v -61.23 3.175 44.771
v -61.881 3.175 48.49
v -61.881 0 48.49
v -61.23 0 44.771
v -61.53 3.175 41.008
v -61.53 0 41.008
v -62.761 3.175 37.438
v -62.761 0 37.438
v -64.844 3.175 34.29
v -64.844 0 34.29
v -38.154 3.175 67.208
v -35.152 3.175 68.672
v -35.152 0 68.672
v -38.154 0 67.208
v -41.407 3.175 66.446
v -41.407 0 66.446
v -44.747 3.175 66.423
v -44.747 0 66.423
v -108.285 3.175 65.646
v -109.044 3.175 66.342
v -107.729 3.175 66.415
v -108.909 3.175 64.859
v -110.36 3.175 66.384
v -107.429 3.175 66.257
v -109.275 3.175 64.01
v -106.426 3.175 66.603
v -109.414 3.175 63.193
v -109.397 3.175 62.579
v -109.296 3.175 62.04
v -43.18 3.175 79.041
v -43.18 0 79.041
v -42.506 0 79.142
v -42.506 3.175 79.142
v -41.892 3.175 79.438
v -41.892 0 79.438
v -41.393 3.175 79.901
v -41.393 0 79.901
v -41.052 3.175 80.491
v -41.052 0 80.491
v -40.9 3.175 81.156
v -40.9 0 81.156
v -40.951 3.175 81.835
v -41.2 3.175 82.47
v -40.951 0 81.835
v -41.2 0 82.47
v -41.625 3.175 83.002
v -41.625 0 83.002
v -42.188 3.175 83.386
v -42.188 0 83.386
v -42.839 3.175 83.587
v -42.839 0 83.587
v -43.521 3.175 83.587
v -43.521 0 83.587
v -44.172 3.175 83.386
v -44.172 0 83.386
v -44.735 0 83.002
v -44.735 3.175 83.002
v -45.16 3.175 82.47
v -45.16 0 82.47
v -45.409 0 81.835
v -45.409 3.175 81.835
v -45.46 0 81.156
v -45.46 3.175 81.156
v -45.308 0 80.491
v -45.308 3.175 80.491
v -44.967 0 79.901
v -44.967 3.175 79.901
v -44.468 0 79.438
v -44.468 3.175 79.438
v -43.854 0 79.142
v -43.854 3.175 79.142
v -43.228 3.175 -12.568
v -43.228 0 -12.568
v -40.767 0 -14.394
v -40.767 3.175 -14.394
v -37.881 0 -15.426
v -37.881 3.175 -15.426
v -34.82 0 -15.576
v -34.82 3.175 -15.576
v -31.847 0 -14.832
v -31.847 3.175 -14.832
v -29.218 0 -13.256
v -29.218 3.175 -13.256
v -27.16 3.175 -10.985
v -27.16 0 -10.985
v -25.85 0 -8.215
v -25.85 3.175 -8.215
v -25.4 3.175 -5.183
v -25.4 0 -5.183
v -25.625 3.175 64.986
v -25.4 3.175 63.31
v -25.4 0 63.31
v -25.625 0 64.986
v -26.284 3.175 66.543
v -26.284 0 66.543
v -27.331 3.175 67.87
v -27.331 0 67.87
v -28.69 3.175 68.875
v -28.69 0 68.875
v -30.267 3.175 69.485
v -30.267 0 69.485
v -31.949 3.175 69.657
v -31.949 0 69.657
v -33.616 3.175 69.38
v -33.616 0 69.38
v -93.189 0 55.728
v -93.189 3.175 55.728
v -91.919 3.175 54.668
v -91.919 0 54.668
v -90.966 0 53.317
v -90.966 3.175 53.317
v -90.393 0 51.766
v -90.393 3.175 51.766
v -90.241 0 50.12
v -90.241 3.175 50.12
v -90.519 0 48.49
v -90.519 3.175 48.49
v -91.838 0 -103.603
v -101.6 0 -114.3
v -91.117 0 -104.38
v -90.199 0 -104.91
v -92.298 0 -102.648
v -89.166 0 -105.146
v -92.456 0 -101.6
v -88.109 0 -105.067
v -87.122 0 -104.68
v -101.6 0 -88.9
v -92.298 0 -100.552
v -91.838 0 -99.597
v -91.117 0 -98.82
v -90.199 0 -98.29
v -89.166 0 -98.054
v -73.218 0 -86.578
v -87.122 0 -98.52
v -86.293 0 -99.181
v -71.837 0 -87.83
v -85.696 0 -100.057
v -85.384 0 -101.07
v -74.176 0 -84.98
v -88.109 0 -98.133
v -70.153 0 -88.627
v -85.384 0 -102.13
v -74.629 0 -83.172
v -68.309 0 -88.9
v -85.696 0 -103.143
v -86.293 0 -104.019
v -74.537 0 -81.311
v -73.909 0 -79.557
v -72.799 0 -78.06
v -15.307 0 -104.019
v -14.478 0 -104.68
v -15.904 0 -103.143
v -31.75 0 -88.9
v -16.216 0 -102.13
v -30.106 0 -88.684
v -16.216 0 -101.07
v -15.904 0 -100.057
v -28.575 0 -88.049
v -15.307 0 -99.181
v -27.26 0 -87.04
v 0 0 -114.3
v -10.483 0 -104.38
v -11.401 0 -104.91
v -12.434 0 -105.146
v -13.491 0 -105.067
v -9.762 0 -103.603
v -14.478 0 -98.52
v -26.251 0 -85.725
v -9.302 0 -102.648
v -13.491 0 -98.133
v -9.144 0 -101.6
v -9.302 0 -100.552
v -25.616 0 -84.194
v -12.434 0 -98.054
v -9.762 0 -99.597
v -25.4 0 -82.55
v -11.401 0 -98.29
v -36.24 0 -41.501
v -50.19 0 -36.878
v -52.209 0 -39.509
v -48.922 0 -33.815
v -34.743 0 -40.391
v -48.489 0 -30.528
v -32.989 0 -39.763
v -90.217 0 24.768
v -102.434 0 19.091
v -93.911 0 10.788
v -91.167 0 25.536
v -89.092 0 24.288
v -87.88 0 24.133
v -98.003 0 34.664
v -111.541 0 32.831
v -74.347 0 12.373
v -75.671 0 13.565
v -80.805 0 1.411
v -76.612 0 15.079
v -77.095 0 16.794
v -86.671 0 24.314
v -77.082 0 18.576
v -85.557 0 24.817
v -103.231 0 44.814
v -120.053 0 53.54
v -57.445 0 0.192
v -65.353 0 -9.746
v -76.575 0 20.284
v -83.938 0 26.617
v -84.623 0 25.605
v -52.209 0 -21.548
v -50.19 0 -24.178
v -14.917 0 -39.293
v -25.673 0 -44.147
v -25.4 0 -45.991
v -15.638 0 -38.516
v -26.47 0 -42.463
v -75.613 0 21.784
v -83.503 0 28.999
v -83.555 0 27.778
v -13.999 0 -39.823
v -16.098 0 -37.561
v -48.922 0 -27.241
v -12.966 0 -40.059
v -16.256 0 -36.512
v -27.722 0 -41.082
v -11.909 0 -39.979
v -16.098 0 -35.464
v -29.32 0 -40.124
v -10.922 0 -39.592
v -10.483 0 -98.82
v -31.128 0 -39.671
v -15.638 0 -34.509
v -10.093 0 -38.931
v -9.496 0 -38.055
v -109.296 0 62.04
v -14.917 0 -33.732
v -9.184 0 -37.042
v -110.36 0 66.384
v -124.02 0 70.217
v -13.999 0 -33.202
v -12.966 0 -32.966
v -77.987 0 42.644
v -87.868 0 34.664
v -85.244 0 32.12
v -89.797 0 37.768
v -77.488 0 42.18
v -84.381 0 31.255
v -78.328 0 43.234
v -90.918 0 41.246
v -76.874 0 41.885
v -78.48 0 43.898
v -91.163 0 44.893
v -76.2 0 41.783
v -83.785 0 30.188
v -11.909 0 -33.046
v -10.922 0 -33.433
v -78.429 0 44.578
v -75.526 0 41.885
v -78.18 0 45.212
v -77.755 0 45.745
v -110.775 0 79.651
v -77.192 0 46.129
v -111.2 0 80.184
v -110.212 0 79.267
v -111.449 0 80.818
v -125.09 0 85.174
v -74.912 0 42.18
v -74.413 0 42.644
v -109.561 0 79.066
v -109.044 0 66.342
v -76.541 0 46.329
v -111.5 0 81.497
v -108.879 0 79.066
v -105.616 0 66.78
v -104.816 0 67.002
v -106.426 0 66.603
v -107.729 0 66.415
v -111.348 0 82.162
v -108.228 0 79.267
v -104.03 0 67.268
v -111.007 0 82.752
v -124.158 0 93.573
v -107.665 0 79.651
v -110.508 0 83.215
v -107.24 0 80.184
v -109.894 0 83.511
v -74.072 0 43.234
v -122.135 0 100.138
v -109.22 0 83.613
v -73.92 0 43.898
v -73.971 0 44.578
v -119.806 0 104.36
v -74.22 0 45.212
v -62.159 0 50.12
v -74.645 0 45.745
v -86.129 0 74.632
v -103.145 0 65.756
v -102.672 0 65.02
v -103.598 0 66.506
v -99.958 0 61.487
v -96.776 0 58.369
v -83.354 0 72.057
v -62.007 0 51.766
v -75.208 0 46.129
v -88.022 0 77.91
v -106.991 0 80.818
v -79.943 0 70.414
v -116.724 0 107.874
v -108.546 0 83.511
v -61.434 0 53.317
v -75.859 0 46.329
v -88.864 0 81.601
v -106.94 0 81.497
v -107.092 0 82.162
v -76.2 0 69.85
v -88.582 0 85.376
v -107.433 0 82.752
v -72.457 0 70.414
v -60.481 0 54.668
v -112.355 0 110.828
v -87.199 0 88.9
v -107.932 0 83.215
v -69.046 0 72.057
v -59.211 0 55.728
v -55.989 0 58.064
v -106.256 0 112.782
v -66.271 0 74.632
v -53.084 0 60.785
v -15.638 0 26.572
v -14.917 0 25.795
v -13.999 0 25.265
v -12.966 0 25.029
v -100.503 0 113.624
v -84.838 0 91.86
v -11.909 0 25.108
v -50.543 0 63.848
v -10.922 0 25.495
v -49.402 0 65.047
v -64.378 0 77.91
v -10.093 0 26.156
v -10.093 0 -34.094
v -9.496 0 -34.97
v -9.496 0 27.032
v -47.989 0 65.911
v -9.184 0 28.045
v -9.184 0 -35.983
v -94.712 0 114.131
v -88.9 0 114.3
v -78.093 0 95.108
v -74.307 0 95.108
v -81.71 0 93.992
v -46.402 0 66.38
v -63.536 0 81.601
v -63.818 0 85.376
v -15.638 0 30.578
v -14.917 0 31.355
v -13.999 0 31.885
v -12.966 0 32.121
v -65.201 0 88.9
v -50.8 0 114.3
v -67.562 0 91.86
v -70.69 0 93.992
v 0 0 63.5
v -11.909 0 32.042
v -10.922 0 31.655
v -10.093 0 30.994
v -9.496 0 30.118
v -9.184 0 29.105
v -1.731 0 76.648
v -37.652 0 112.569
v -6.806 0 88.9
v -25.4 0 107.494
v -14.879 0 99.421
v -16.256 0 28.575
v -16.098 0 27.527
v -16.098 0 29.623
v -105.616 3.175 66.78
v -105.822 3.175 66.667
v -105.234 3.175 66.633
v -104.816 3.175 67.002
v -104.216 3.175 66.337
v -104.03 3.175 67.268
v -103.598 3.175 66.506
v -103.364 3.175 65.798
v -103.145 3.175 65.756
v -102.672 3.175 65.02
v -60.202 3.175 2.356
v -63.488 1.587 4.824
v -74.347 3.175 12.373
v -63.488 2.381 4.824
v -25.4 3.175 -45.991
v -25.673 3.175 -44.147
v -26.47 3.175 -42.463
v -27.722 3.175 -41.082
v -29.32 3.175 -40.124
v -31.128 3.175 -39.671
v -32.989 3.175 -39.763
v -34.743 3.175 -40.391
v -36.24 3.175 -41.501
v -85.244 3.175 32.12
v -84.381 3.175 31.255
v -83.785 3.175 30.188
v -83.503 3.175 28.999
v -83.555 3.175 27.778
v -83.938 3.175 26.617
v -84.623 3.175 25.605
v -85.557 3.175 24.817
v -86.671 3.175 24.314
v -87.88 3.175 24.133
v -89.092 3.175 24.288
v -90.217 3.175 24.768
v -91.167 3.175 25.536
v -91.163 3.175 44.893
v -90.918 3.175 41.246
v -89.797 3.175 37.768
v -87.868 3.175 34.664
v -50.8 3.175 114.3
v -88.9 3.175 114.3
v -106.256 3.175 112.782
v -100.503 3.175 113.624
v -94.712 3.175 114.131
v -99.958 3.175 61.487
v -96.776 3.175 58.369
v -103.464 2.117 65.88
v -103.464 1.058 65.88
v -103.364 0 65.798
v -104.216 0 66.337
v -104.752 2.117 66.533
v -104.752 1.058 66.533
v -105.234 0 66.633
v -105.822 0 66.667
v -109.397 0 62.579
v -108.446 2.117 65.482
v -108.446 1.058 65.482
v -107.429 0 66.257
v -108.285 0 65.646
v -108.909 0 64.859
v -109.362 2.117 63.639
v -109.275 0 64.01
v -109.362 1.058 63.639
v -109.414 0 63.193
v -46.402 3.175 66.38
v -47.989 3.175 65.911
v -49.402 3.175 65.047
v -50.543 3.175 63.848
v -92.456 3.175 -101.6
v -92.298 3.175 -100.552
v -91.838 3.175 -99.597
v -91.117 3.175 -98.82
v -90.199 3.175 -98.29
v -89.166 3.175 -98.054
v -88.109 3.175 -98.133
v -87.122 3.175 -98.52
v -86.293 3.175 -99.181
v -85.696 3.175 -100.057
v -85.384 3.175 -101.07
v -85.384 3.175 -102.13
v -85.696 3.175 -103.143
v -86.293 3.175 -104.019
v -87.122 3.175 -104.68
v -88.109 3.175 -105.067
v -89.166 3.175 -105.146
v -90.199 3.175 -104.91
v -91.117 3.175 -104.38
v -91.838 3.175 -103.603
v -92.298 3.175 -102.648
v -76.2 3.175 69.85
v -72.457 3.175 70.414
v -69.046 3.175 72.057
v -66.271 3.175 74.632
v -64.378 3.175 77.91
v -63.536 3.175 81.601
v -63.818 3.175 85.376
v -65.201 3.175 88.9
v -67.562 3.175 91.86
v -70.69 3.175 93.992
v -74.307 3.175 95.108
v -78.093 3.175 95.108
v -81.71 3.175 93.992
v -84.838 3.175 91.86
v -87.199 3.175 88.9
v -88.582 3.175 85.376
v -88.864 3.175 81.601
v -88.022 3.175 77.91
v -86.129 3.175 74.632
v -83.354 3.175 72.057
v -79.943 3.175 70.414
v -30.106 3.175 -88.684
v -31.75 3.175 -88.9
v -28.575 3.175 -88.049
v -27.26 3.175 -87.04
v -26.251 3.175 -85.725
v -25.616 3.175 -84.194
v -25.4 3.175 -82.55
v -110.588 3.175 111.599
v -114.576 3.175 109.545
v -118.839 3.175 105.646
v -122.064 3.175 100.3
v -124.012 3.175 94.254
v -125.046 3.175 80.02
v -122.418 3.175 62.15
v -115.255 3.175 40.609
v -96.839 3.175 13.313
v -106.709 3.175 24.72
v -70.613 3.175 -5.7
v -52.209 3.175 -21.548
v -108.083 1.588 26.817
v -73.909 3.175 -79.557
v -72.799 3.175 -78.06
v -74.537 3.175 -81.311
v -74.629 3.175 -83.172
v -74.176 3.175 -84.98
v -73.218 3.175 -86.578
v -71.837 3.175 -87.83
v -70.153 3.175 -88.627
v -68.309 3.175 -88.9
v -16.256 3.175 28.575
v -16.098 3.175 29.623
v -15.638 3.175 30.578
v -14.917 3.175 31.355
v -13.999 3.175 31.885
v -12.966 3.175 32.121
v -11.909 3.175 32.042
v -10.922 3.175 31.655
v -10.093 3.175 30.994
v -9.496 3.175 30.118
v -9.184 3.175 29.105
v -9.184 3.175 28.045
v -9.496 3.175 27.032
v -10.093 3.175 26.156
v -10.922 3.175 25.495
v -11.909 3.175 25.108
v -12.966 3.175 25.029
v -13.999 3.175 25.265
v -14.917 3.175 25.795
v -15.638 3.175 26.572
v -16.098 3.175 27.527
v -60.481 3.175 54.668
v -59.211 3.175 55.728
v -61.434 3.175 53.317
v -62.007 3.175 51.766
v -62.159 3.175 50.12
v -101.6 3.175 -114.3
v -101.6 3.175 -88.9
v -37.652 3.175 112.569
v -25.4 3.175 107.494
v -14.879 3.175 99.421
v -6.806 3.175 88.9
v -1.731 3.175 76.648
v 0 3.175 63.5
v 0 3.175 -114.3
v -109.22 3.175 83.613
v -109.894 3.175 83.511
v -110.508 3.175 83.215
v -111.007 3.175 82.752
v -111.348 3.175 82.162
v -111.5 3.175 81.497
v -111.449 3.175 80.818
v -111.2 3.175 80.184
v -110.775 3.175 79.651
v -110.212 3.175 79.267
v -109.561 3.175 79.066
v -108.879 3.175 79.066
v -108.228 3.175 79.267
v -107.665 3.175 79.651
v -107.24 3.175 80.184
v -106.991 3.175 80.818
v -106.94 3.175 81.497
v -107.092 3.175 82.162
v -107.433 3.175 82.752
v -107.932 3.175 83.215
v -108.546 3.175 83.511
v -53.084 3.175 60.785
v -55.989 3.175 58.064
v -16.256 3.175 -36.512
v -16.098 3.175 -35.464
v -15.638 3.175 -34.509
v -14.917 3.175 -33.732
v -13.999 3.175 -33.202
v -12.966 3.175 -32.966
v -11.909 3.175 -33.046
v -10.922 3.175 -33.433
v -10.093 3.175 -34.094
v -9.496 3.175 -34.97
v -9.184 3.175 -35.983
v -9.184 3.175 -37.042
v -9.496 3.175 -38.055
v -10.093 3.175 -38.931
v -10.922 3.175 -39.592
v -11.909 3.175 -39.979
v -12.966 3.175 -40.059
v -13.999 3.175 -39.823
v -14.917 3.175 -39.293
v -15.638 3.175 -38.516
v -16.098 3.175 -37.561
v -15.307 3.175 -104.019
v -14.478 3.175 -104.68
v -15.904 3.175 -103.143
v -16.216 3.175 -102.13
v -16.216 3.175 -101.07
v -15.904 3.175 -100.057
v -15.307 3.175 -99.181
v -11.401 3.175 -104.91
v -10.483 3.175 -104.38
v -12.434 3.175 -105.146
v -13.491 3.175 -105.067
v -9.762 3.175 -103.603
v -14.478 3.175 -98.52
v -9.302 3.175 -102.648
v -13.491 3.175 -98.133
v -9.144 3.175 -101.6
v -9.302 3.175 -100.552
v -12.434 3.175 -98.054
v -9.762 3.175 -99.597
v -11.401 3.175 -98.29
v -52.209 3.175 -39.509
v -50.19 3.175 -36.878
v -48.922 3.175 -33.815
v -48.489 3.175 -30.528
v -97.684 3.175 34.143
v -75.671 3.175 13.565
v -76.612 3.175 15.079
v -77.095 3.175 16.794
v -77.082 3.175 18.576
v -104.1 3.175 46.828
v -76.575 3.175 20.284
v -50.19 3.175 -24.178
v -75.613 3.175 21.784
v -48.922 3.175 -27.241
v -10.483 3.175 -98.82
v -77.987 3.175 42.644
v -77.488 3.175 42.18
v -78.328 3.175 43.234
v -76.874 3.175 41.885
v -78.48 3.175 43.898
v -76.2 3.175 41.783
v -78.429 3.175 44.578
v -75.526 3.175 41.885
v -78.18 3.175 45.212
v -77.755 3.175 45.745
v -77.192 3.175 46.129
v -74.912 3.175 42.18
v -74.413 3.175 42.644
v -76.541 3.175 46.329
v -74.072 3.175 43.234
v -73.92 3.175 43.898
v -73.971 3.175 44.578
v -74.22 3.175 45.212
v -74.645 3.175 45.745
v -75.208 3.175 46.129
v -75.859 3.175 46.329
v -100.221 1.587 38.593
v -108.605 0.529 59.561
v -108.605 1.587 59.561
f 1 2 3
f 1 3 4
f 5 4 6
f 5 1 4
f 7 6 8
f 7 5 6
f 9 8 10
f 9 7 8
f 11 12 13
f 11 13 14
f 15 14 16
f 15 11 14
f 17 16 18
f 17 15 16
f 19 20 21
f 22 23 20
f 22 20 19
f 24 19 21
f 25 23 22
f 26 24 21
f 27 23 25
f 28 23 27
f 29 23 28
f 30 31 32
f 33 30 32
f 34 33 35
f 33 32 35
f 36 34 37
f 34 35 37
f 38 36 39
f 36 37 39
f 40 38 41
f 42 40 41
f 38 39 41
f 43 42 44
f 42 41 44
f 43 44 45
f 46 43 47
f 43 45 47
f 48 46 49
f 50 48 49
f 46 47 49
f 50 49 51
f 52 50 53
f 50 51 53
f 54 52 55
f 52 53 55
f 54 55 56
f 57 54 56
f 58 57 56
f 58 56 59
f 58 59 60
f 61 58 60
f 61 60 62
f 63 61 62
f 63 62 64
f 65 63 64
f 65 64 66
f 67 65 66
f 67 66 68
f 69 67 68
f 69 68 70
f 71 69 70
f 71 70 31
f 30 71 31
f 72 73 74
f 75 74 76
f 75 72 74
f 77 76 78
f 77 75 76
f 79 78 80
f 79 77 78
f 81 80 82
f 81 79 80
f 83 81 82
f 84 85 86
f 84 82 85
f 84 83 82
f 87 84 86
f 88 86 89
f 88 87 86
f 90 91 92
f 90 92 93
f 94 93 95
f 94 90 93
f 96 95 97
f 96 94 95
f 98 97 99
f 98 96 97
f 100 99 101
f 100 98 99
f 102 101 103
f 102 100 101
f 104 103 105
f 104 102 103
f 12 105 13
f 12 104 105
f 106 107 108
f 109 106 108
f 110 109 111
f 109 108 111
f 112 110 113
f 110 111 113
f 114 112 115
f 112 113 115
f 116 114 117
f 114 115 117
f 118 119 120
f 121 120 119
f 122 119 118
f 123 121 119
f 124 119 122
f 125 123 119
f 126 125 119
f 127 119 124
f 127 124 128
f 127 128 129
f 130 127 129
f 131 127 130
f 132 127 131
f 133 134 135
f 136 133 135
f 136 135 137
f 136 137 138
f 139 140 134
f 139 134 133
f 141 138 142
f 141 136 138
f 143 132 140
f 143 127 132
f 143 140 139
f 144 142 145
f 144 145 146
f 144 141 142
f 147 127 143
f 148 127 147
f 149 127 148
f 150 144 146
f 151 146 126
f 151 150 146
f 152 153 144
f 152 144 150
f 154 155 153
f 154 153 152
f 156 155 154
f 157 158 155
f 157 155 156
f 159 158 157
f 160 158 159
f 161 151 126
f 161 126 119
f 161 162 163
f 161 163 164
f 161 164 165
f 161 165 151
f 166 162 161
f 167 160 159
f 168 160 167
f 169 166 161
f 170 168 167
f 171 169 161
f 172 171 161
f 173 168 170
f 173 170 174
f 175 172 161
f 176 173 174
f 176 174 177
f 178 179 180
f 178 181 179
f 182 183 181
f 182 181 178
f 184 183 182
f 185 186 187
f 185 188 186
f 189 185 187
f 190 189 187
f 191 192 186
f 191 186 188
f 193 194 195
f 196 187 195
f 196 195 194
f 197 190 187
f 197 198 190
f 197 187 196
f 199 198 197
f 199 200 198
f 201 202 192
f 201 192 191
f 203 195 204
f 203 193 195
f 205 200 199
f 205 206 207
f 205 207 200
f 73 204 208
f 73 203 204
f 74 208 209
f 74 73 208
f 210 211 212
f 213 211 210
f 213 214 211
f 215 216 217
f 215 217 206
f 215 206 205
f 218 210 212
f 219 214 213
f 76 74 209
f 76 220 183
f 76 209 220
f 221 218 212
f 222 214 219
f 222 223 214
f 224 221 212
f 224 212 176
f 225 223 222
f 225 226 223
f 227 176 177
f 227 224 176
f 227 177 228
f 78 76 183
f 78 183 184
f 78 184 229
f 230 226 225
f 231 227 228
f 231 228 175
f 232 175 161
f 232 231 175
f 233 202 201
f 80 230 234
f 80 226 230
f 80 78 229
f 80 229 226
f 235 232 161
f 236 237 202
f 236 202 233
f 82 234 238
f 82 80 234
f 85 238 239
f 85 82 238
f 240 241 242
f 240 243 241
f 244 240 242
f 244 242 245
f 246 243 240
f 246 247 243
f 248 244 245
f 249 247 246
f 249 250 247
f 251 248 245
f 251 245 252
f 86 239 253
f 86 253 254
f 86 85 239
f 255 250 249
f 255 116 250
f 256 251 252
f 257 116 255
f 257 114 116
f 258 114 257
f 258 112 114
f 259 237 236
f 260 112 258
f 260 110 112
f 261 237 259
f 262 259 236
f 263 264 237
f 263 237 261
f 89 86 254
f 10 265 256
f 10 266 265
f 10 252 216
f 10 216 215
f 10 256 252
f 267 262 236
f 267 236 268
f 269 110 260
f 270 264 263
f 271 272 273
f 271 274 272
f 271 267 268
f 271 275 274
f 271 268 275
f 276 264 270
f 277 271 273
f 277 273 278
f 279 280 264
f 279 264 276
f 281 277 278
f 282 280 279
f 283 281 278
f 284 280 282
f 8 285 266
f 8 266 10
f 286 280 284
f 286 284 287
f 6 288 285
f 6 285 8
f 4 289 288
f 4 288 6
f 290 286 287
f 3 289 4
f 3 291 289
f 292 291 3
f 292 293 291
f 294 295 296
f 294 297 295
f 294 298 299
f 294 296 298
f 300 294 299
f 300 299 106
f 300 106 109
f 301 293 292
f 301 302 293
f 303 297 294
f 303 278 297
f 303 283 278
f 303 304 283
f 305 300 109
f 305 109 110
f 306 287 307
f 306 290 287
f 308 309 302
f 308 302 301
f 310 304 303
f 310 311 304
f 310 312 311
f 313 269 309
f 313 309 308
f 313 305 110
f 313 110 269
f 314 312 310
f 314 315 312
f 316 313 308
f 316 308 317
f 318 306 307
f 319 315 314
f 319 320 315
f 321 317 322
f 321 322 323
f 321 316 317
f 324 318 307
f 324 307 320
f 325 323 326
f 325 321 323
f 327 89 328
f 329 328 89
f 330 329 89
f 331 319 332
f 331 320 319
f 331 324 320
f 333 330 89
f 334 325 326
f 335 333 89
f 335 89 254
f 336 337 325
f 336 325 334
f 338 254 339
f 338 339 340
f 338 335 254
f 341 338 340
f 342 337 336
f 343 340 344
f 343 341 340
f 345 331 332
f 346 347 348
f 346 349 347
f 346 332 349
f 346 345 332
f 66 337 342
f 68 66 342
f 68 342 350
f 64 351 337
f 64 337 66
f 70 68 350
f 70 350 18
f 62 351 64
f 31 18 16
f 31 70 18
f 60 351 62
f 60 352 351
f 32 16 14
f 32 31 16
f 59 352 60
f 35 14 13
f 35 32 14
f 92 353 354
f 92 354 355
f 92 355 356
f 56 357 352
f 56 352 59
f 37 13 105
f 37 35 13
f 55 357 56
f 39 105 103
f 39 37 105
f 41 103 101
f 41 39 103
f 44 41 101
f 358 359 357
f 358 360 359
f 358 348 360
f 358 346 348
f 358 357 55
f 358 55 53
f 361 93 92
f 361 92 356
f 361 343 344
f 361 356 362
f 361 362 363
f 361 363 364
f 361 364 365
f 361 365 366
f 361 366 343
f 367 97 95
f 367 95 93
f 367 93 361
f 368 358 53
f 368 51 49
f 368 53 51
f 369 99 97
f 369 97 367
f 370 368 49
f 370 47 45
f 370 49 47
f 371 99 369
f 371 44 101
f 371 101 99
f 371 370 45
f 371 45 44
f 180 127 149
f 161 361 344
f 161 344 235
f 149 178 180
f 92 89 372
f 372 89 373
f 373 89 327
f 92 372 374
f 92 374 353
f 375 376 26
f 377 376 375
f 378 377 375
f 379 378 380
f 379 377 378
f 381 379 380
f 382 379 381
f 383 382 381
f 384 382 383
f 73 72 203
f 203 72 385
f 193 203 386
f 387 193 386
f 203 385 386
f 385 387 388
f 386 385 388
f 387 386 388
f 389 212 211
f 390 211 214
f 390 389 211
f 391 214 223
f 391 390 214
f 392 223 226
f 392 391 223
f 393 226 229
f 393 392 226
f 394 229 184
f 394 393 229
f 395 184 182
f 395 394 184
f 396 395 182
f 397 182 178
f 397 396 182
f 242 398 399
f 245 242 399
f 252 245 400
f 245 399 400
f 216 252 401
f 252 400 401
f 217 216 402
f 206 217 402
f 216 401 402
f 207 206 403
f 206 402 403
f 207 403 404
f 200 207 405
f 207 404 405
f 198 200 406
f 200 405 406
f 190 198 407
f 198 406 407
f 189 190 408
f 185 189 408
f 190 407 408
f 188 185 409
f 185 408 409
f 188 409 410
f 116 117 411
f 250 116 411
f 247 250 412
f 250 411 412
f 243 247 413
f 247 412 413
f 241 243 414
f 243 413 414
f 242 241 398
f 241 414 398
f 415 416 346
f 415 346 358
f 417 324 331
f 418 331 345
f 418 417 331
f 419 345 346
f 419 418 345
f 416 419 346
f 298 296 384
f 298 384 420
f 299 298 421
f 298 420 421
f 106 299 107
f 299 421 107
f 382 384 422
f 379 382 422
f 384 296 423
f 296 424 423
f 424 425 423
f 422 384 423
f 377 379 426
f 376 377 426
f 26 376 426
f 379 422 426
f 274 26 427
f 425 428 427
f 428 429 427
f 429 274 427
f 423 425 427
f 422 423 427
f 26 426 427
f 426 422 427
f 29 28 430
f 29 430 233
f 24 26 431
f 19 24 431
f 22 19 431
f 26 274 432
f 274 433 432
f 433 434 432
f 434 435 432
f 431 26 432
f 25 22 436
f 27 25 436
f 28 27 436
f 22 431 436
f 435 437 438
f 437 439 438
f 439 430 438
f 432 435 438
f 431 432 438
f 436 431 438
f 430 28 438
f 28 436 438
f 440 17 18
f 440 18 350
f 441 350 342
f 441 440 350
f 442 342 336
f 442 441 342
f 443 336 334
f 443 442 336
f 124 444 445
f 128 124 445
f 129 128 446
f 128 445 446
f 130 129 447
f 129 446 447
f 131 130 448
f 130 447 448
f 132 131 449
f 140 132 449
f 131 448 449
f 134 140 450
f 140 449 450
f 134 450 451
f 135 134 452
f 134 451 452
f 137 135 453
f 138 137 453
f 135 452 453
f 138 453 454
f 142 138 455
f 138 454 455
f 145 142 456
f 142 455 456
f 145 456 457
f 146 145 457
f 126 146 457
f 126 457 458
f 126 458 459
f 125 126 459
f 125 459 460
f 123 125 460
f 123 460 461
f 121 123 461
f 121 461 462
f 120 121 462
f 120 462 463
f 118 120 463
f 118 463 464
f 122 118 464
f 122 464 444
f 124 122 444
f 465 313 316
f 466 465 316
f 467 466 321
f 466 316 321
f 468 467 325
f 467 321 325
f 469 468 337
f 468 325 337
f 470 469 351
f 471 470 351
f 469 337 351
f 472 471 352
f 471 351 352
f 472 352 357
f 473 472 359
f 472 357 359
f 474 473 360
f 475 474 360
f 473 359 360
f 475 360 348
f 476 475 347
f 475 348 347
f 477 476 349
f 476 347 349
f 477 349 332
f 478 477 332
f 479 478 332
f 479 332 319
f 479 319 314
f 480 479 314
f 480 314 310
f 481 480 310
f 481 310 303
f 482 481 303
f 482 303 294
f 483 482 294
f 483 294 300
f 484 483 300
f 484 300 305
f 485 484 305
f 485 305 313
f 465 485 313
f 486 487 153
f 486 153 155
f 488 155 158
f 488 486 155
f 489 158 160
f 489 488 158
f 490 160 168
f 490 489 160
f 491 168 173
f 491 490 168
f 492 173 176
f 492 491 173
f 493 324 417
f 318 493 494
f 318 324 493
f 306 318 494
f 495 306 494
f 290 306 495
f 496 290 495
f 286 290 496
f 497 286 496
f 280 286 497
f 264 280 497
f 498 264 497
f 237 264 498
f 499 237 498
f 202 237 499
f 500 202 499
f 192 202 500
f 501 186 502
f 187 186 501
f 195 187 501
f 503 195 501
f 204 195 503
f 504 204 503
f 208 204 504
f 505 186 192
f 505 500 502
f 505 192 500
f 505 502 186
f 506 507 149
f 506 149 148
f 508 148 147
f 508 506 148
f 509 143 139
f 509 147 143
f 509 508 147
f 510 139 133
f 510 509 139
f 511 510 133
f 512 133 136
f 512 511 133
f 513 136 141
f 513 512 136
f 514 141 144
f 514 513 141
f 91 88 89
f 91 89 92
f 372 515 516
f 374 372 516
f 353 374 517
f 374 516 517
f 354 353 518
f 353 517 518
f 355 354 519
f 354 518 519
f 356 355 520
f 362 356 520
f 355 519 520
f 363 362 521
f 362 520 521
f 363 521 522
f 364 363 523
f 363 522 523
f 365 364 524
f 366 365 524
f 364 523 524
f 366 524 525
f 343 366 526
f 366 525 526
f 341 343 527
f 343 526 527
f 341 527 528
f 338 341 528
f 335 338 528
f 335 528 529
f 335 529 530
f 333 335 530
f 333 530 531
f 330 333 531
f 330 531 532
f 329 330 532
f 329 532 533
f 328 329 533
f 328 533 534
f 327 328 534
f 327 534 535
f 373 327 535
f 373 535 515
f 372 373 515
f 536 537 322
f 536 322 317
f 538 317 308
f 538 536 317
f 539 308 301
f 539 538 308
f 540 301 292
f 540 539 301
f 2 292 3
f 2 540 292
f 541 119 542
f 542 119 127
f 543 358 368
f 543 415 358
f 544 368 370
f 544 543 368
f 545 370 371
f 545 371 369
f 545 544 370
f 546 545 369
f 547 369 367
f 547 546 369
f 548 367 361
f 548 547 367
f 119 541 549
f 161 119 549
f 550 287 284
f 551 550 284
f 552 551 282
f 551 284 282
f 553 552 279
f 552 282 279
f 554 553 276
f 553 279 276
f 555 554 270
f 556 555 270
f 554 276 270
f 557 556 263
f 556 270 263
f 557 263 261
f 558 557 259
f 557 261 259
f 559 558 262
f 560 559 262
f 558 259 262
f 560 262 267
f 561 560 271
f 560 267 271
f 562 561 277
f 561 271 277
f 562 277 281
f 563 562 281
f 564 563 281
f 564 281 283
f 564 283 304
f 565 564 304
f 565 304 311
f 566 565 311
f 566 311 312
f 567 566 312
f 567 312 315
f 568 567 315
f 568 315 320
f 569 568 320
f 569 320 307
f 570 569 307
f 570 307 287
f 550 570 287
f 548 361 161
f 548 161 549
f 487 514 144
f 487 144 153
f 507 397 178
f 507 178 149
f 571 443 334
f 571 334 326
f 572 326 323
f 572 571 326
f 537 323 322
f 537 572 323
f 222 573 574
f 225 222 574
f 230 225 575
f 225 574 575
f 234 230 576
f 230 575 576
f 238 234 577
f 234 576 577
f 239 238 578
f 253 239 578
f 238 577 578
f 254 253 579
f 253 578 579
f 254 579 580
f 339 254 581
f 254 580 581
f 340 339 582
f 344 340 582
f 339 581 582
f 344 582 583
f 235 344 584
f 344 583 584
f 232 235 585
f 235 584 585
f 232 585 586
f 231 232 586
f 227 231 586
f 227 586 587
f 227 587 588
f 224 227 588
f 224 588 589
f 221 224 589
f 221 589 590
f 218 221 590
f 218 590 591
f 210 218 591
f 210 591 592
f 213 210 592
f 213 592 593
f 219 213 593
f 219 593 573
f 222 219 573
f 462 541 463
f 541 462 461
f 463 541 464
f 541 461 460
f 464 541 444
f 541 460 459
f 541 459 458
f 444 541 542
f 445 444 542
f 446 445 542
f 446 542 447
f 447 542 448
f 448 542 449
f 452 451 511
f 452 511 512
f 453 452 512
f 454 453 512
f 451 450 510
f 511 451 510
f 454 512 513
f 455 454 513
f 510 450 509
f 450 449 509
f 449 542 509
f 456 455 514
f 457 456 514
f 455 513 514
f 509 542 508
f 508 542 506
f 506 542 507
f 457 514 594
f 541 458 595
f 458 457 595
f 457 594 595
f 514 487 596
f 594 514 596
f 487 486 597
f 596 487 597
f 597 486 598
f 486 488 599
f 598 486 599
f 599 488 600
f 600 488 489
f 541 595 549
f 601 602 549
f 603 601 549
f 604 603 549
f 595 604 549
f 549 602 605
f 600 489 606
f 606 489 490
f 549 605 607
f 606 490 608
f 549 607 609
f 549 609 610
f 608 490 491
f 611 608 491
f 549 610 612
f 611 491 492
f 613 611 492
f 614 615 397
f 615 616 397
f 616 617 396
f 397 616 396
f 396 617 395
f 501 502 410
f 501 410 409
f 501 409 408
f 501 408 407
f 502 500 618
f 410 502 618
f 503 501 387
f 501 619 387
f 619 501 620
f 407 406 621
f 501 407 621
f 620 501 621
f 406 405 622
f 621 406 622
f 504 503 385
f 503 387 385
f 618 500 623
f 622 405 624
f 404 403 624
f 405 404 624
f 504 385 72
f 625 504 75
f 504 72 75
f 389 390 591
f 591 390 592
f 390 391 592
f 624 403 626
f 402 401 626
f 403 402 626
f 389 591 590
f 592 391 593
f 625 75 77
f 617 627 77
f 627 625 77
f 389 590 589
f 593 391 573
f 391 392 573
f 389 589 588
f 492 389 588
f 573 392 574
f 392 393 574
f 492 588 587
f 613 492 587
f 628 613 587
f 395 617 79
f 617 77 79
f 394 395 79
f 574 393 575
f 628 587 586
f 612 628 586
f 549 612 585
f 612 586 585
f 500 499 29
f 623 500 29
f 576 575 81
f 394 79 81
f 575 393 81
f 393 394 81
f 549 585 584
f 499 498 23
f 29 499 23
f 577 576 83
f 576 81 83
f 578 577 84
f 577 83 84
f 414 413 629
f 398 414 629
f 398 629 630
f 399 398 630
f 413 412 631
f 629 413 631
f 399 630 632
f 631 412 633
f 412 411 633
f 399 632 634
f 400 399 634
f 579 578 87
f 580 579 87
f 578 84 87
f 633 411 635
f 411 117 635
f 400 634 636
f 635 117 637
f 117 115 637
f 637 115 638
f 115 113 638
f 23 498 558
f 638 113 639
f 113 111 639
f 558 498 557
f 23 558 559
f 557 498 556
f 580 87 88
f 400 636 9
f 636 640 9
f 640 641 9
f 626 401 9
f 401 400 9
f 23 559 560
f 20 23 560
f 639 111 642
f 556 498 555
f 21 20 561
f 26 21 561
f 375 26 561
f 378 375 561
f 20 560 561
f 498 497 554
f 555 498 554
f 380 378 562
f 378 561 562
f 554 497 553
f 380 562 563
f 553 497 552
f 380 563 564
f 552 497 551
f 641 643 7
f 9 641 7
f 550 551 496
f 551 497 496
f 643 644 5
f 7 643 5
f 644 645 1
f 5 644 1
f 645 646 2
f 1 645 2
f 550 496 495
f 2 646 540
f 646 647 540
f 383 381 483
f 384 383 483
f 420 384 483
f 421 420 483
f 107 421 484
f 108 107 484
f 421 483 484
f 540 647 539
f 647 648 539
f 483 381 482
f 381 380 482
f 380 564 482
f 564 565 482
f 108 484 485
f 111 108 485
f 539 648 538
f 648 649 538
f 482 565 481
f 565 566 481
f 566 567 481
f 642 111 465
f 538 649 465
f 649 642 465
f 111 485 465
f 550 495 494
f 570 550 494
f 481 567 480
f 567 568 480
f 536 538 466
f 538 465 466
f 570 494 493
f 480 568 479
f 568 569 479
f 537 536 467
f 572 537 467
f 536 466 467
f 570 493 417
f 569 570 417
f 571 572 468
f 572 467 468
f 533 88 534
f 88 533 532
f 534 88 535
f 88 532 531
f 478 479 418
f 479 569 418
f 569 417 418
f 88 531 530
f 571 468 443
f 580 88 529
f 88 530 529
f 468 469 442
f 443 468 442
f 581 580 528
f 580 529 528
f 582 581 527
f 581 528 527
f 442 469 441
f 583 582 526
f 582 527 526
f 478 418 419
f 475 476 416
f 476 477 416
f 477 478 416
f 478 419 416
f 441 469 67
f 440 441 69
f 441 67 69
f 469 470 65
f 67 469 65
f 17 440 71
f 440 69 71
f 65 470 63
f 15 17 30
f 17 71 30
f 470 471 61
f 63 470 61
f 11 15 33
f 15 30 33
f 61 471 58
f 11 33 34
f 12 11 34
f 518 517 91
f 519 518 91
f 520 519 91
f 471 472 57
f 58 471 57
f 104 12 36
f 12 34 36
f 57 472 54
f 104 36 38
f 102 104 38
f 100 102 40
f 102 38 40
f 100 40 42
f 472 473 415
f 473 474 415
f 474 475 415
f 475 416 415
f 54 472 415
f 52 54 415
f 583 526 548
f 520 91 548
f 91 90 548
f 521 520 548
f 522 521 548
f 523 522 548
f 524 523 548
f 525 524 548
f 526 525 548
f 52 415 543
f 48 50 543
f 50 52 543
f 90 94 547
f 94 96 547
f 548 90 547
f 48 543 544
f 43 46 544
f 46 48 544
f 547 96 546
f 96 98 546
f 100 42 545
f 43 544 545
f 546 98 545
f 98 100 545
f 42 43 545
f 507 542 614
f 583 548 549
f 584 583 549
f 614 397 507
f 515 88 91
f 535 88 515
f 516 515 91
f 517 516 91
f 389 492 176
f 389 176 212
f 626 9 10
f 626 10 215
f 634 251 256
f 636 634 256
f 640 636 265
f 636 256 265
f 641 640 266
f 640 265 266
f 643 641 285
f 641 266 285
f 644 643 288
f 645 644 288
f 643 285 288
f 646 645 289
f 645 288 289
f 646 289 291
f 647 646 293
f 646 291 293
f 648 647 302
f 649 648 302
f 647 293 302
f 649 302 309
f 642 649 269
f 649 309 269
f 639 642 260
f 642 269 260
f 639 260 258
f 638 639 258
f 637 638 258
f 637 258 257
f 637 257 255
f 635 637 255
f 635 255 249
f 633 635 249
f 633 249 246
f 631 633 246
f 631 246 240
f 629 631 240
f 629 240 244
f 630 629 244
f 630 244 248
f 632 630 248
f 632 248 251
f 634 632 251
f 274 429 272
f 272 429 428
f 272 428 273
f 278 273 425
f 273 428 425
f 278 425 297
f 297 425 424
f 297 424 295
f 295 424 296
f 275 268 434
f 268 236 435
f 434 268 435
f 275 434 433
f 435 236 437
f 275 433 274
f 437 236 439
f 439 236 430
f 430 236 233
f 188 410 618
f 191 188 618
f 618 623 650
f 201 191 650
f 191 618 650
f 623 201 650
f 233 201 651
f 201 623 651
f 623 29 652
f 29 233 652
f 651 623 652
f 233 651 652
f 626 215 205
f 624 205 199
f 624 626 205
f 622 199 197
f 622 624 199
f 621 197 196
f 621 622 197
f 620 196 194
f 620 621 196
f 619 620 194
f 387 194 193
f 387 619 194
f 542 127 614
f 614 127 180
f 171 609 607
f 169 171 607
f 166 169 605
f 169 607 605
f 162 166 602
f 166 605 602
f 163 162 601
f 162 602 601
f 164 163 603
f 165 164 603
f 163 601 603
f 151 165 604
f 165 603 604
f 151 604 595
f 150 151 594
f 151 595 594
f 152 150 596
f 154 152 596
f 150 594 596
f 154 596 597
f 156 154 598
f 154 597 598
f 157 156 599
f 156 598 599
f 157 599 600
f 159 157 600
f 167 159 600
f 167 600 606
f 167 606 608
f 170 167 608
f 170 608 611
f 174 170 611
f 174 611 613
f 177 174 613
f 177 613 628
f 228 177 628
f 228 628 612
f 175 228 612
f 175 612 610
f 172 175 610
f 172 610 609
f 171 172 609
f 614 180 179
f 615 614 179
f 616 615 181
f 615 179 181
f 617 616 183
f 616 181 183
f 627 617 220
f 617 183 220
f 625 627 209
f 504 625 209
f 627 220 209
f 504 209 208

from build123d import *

# Parameters (mm, degrees)
SKETCH1_W               = 254
SKETCH1_H               = 3.175
BASE_FLANGE1_DEPTH      = 114.3
SKETCH6_R               = 12.7
CUT_EXTRUDE1_DEPTH      = 279.550840288
SKETCH7_R               = 2.286
CUT_EXTRUDE2_DEPTH      = 279.550840288
SKETCH9_R               = 3.556
CUT_EXTRUDE4_DEPTH      = 279.550840288
CUT_EXTRUDE6_DEPTH      = 279.550840288
CUT_EXTRUDE9_DEPTH      = 279.550840288
CUT_EXTRUDE9_DEPTH_BACK = 279.550840288
CUT_EXTRUDE10_DEPTH     = 221.768639368
FILLET1_R               = 50.8
CUT_EXTRUDE11_DEPTH     = 170.498049701
FILLET2_DEPTH           = 3.175


with BuildPart() as part:
    # Base-Flange1: sheet metal written as solids
    # Sketch1 → Base-Flange1 (new, symmetric)
    with BuildSketch(Plane.XY):
        with Locations((-127, 1.5875)):
            Rectangle(SKETCH1_W, SKETCH1_H)
    extrude(amount=BASE_FLANGE1_DEPTH, both=True)

    # Sketch6 → Cut-Extrude1 (cut, through all)
    with BuildSketch(Plane.XZ):
        with Locations(Location((-76.2, 82.55, 0), (0, 0, 270))):
            Circle(SKETCH6_R)
    extrude(amount=-CUT_EXTRUDE1_DEPTH, mode=Mode.SUBTRACT)

    # Sketch7 → Cut-Extrude2 (cut, through all)
    with BuildSketch(Plane.XZ):
        with Locations(Location((-43.18, 81.326566426, 0), (0, 0, 270))):
            Circle(SKETCH7_R)
        with Locations(Location((-109.22, 81.326566426, 0), (0, 0, 90))):
            Circle(SKETCH7_R)
        with Locations(Location((-76.2, 44.069, 0), (0, 0, 270))):
            Circle(SKETCH7_R)
    extrude(amount=-CUT_EXTRUDE2_DEPTH, mode=Mode.SUBTRACT)

    # Sketch9 → Cut-Extrude4 (cut, through all)
    with BuildSketch(Plane(origin=(0, 3.175, 0), x_dir=(1, 0, 0), z_dir=(0, 1, 0))):
        with Locations(Location((-12.7, 36.5125, 0), (0, 0, 180))):
            Circle(SKETCH9_R)
        with Locations((-12.7, 101.6)):
            Circle(SKETCH9_R)
        with Locations(Location((-12.7, -28.575, 0), (0, 0, 180))):
            Circle(SKETCH9_R)
        with Locations(Location((-88.9, 101.6, 0), (0, 0, 180))):
            Circle(SKETCH9_R)
    extrude(amount=-CUT_EXTRUDE4_DEPTH, mode=Mode.SUBTRACT)

    # Sketch15 → Cut-Extrude6 (cut, through all)
    with BuildSketch(Plane.XZ):
        Polygon((-101.6, -114.3), (-254, 38.1), (-254, -114.3), align=None)
    extrude(amount=-CUT_EXTRUDE6_DEPTH, mode=Mode.SUBTRACT)

    # Sketch17 → Cut-Extrude9 (cut, two sides: drawn at the far end of the back side and taken through both)
    with BuildSketch(Plane.XZ.offset(-CUT_EXTRUDE9_DEPTH_BACK)):
        with BuildLine():
            Line((-254, 114.3), (-254, 38.1))
            Line((-254, 38.1), (-159.5751337, -56.3248663))
            ThreePointArc((-159.5751337, -56.3248663), (-181.24151223, 52.599374135), (-88.9, 114.3))
            Line((-88.9, 114.3), (-254, 114.3))
        make_face()
    extrude(amount=CUT_EXTRUDE9_DEPTH + CUT_EXTRUDE9_DEPTH_BACK, mode=Mode.SUBTRACT)

    # Sketch18 → Cut-Extrude10 (cut, through all)
    with BuildSketch(Plane.XZ):
        with BuildLine():
            Line((-101.6, -114.3), (-101.6, -88.9))
            Line((-101.6, -88.9), (-52.208591334, -39.508591334))
            ThreePointArc((-52.208591334, -39.508591334), (-48.488847455, -30.528335213), (-52.208591334, -21.548079092))
            add(Edge.make_bspline(
                [(-106.256088924, 112.781538976), (-137.236150888, 107.318918188), (-113.262137977, 5.562411407), (-77.644814764, 3.888144338), (-52.208591334, -21.548079092)],
                knots=[0, 0, 0, 0, 0.537792704, 1, 1, 1, 1], degree=3))
            ThreePointArc((-106.256088924, 112.781538976), (-184.223754204, 44.405731651), (-159.5751337, -56.3248663))
            Line((-159.5751337, -56.3248663), (-101.6, -114.3))
        make_face()
    extrude(amount=-CUT_EXTRUDE10_DEPTH, mode=Mode.SUBTRACT)

    # Fillet1
    fillet1_edges = [part.edges().sort_by_distance(p)[0] for p in [
        (0, 1.5875, 114.3),
    ]]
    fillet(fillet1_edges, radius=FILLET1_R)

    # Sketch19 → Cut-Extrude11 (cut, through all)
    with BuildSketch(Plane(origin=(0, 3.175, 0), x_dir=(1, 0, 0), z_dir=(0, 1, 0))):
        with BuildLine():
            Line((-68.309231637, 88.9), (-31.75, 88.9))
            ThreePointArc((-31.75, 88.9), (-27.259871939, 87.040128061), (-25.4, 82.55))
            Line((-25.4, 82.55), (-25.4, 45.990768363))
            ThreePointArc((-25.4, 45.990768363), (-29.319960204, 40.124133332), (-36.240128061, 41.500640303))
            Line((-36.240128061, 41.500640303), (-72.799359697, 78.059871939))
            ThreePointArc((-72.799359697, 78.059871939), (-74.175866668, 84.980039796), (-68.309231637, 88.9))
        make_face()
        with BuildLine():
            Line((-25.4, 5.183084731), (-25.4, -63.31046263))
            ThreePointArc((-25.4, -63.31046263), (-28.690493445, -68.874806225), (-35.151785714, -68.672398284))
            ThreePointArc((-35.151785714, -68.672398284), (-39.759262533, -66.736201414), (-44.747192121, -66.422737896))
            ThreePointArc((-44.747192121, -66.422737896), (-47.9893887, -65.910636081), (-50.542713816, -63.847963596))
            ThreePointArc((-50.542713816, -63.847963596), (-54.493856691, -59.378771231), (-59.211239435, -55.727537129))
            ThreePointArc((-59.211239435, -55.727537129), (-61.771128872, -52.560544764), (-61.88090181, -48.489817008))
            ThreePointArc((-61.88090181, -48.489817008), (-61.530034533, -41.007577259), (-64.844174471, -34.290174786))
            Line((-64.844174471, -34.290174786), (-75.613232293, -21.784424959))
            ThreePointArc((-75.613232293, -21.784424959), (-77.094715661, -16.793975806), (-74.346704518, -12.372685217))
            add(Edge.make_bspline(
                [(-43.228335213, 12.567822971), (-46.917497652, 8.878660532), (-50.456440758, 5.648495964), (-57.219614246, -0.085464925), (-60.443504999, -2.588941631), (-66.531496779, -7.059997253), (-69.394290936, -9.027669237), (-72.834328708, -11.354789552), (-73.599593433, -11.869910022), (-74.346704518, -12.372685217)],
                knots=[0, 0, 0, 0, 0.0625, 0.0625, 0.125, 0.125, 0.1875, 0.1875, 0.205929014, 0.205929014, 0.205929014, 0.205929014], degree=3))
            ThreePointArc((-43.228335213, 12.567822971), (-31.847005437, 14.831710221), (-25.4, 5.183084731))
        make_face()
        with BuildLine():
            ThreePointArc((-110.360018807, -66.383991242), (-107.147438621, -66.484575814), (-104.030197179, -67.267898542))
            ThreePointArc((-104.030197179, -67.267898542), (-99.340434929, -60.811031043), (-93.188760565, -55.727537129))
            ThreePointArc((-93.188760565, -55.727537129), (-90.628871128, -52.560544764), (-90.51909819, -48.489817008))
            ThreePointArc((-90.51909819, -48.489817008), (-90.463817251, -39.472945885), (-85.244463491, -32.12003033))
            ThreePointArc((-85.244463491, -32.12003033), (-84.622720301, -25.604510261), (-91.167480683, -25.536115004))
            add(Edge.make_bspline(
                [(-91.167480683, -25.536115004), (-92.635934993, -27.101357134), (-94.055170685, -28.817008687), (-96.262497765, -31.913028022), (-97.045227937, -33.09572145), (-98.628898545, -35.6878173), (-99.428995475, -37.095537018), (-101.805342608, -41.586869819), (-103.35622482, -44.937897773), (-106.205005263, -52.031513868), (-107.504026121, -55.775168297), (-109.265538459, -61.831529556), (-109.854670713, -64.117538163), (-110.360018807, -66.383991242)],
                knots=[0.380798959, 0.380798959, 0.380798959, 0.380798959, 0.4375, 0.4375, 0.46875, 0.46875, 0.5, 0.5, 0.5625, 0.5625, 0.625, 0.625, 0.662483442, 0.662483442, 0.662483442, 0.662483442], degree=3))
        make_face()
    extrude(amount=-CUT_EXTRUDE11_DEPTH, mode=Mode.SUBTRACT)

    # Fillet2: read off the stored shape, not the designer's step
    # Fillet2 outline → Fillet2 (add)
    with BuildSketch(Plane(origin=(0, 0, 0), x_dir=(1.0, 1.1573850035061633e-12, 0), z_dir=(-1.1573850035061633e-12, 1.0, 0))):
        with BuildLine():
            ThreePointArc((-104.030197179, -67.267898542), (-103.374185767, -66.129703781), (-102.671651197, -65.019621142))
            add(Edge.make_bspline(
                [(-102.671651197, -65.019621142), (-103.429510547, -66.164022442), (-104.780608937, -66.91555764), (-106.42610863, -66.603307038)],
                knots=[0, 0, 0, 0, 0.430480656, 0.430480656, 0.430480656, 0.430480656], degree=3, weights=[1, 0.75936345, 0.62231628, 0.58885849]))
            ThreePointArc((-106.42610863, -66.603307038), (-105.214346034, -66.885827792), (-104.030197179, -67.267898542))
        make_face()
        with BuildLine():
            ThreePointArc((-110.360018807, -66.383991242), (-108.385824678, -66.363801056), (-106.42610863, -66.603307038))
            add(Edge.make_bspline(
                [(-106.42610863, -66.603307038), (-108.913766663, -66.131248173), (-109.817041103, -63.994539841), (-109.296016182, -62.039816736)],
                knots=[0.430480656, 0.430480656, 0.430480656, 0.430480656, 1, 1, 1, 1], degree=3, weights=[0.58885849, 0.544594344, 0.681641514, 1]))
            add(Edge.make_bspline(
                [(-109.296016182, -62.039816736), (-109.682496439, -63.489770196), (-110.038242372, -64.940845021), (-110.360018807, -66.383991242)],
                knots=[0.638616154, 0.638616154, 0.638616154, 0.638616154, 0.662483442, 0.662483442, 0.662483442, 0.662483442], degree=3))
        make_face()
    extrude(amount=FILLET2_DEPTH)


solid = part.part
